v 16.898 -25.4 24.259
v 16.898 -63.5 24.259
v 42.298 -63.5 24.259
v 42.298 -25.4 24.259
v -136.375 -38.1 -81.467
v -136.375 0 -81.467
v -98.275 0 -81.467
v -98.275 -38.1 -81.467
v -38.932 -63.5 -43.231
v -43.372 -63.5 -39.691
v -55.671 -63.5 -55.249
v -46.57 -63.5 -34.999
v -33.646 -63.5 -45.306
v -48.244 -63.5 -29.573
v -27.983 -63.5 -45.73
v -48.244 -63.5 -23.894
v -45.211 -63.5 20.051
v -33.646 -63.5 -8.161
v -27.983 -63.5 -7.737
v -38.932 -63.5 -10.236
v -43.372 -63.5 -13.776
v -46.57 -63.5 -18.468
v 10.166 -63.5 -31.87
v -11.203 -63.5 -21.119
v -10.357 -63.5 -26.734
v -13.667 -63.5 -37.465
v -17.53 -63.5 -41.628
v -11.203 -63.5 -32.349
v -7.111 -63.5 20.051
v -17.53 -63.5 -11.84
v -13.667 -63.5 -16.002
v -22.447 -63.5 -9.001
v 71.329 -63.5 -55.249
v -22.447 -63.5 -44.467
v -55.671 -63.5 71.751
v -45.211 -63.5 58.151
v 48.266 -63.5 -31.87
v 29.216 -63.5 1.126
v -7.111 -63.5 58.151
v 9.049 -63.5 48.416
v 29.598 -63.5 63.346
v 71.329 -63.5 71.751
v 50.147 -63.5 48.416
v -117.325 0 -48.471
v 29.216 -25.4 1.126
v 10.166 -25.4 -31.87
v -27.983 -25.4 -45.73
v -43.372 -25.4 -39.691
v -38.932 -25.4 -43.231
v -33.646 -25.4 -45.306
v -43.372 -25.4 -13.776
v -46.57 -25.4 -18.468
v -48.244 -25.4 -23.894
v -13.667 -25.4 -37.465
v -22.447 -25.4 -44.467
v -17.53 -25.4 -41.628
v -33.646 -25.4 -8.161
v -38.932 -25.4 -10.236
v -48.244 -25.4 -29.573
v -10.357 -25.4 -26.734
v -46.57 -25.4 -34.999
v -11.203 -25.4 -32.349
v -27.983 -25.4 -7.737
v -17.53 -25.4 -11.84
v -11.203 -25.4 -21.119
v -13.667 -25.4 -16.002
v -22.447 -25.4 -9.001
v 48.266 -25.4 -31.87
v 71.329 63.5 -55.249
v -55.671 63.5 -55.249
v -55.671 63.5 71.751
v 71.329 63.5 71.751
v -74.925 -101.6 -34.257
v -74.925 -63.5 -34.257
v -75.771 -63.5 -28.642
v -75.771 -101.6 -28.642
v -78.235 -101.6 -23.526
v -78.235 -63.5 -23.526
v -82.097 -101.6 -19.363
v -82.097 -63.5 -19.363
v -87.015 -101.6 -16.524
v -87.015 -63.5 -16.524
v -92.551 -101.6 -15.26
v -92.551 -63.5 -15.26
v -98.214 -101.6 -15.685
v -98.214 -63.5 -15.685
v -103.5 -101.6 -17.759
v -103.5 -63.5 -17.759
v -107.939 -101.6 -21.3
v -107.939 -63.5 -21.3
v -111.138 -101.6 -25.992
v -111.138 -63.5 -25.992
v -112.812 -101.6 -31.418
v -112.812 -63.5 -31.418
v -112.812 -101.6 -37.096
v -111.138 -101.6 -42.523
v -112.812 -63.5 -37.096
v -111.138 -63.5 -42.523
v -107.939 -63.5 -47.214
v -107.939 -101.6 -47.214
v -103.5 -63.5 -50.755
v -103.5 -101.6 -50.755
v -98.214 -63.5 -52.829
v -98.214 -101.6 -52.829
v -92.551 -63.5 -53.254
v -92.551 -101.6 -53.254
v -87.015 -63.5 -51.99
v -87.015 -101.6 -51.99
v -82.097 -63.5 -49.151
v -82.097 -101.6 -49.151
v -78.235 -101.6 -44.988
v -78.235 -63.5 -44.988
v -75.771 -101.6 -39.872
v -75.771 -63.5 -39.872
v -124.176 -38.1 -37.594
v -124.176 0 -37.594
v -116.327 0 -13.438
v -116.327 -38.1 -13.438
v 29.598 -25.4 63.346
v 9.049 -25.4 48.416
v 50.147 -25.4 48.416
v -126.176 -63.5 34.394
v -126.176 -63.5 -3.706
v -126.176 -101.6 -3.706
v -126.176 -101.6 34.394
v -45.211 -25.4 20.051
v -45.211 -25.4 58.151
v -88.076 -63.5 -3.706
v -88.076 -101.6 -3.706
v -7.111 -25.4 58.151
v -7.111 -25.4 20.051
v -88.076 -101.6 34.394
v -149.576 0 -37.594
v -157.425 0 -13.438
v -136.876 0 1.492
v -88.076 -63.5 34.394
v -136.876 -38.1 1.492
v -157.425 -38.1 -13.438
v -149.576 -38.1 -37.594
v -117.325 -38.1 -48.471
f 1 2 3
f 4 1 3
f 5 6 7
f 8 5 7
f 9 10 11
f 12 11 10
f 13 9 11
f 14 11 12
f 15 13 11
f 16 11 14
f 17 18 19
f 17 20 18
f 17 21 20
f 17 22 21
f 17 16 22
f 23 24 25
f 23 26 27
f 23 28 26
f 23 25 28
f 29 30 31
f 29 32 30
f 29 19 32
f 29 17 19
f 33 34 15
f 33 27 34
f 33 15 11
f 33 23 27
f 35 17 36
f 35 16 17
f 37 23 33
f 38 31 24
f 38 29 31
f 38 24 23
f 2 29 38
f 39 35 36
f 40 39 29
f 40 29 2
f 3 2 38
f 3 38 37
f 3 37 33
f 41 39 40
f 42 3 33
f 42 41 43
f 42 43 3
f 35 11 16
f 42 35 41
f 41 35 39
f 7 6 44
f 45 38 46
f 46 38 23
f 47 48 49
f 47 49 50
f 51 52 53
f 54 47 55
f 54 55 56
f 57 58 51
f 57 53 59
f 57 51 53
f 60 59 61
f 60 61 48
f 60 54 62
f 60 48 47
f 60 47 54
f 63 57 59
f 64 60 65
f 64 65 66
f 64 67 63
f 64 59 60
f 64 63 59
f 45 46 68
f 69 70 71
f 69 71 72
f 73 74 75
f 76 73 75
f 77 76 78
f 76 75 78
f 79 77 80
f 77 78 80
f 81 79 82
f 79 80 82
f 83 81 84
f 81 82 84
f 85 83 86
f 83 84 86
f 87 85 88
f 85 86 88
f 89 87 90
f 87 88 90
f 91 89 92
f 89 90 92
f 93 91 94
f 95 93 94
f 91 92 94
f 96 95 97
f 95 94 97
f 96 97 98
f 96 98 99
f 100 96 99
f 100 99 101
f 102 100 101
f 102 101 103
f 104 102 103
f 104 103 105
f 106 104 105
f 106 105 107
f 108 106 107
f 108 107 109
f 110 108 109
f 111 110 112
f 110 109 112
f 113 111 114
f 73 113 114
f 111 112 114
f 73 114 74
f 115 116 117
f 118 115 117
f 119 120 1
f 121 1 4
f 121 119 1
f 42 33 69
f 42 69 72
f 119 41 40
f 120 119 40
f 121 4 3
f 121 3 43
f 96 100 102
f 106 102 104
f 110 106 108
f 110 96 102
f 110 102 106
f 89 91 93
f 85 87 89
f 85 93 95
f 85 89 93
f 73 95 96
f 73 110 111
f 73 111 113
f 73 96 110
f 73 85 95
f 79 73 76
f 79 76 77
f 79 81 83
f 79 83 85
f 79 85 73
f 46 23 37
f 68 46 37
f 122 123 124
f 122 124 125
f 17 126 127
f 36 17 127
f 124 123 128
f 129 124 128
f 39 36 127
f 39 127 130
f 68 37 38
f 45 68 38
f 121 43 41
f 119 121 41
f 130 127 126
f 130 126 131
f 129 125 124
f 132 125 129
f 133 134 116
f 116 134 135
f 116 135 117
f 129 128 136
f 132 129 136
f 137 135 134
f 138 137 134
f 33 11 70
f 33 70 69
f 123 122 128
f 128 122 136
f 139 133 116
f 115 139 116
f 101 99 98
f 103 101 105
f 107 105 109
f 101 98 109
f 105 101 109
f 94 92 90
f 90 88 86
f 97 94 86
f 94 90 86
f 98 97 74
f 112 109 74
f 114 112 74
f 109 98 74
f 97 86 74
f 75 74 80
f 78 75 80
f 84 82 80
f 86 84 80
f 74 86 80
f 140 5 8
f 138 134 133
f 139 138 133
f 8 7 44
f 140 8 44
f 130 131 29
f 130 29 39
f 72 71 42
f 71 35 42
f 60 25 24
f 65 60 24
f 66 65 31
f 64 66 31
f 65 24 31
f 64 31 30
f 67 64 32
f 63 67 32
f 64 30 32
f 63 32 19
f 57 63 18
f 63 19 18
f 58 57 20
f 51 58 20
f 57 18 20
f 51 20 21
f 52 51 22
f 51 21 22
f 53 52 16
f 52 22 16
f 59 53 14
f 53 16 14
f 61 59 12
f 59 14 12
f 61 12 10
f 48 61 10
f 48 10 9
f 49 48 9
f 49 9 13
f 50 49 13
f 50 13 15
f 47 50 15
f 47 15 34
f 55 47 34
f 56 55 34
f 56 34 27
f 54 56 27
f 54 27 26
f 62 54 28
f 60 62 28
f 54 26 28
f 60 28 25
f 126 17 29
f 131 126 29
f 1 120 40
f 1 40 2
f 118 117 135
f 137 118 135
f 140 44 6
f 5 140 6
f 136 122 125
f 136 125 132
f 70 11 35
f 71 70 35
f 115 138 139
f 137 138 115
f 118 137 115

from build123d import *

# Parameters (mm, degrees)
F0_W      = 127
F0_H      = 127
F1_DEPTH  = 63.5
F2_W      = 38.1
F2_H      = 38.1
F3_DEPTH  = 38.1
F5_DEPTH  = 38.1
F7_DEPTH  = 38.1
F8_R      = 19.05
F9_DEPTH  = 38.1
F10_W     = 38.1
F10_H     = 38.1
F11_DEPTH = 38.1
F13_DEPTH = 38.1
F15_DEPTH = 38.1
F16_R     = 19.05
F17_DEPTH = 38.1


with BuildPart() as f1:
    # F0 (on Front) → F1 (new body, symmetric)
    with BuildSketch(Plane.XZ):
        with Locations((7.829141, 8.251459)):
            Rectangle(F0_W, F0_H)
    extrude(amount=F1_DEPTH, both=True)

    # F2 (on face) → F3 (cut)
    with BuildSketch(Plane.XZ.offset(63.5)):
        with Locations((-26.160787, 39.100661)):
            Rectangle(F2_W, F2_H)
    extrude(amount=-F3_DEPTH, mode=Mode.SUBTRACT)

    # F4 (on face) → F5 (cut)
    with BuildSketch(Plane.XZ.offset(63.5)):
        Polygon((16.897972, 24.259223), (42.297972, 24.259223), (50.147003, 48.416059), (29.597972, 63.345804), (9.04894, 48.416059), align=None)
    extrude(amount=-F5_DEPTH, mode=Mode.SUBTRACT)

    # F6 (on face) → F7 (cut)
    with BuildSketch(Plane.XZ.offset(63.5)):
        Polygon((10.16606, -31.869634), (48.26606, -31.869634), (29.21606, 1.125934), align=None)
    extrude(amount=-F7_DEPTH, mode=Mode.SUBTRACT)

    # F8 (on face) → F9 (cut)
    with BuildSketch(Plane.XZ.offset(63.5)):
        with Locations((-29.407017, -26.733652)):
            Circle(F8_R)
    extrude(amount=-F9_DEPTH, mode=Mode.SUBTRACT)


with BuildPart() as f11:
    # F10 (on face) → F11 (new body)
    with BuildSketch(Plane.XZ.offset(63.5)):
        with Locations((-107.125565, 15.344292)):
            Rectangle(F10_W, F10_H)
    extrude(amount=F11_DEPTH)


with BuildPart() as f13:
    # F12 (on Front) → F13 (new body)
    with BuildSketch(Plane.XZ):
        Polygon((-149.575996, -37.594398), (-124.175996, -37.594398), (-116.326964, -13.437562), (-136.875996, 1.492183), (-157.425027, -13.437562), align=None)
    extrude(amount=F13_DEPTH)


with BuildPart() as f15:
    # F14 (on Front) → F15 (new body)
    with BuildSketch(Plane.XZ):
        Polygon((-117.325026, -48.471496), (-136.375026, -81.467063), (-98.275026, -81.467063), align=None)
    extrude(amount=F15_DEPTH)


with BuildPart() as f17:
    # F16 (on face) → F17 (new body)
    with BuildSketch(Plane.XZ.offset(63.5)):
        with Locations((-93.97468, -34.257043)):
            Circle(F16_R)
    extrude(amount=F17_DEPTH)


solid = Compound([f1.part, f11.part, f13.part, f15.part, f17.part])
